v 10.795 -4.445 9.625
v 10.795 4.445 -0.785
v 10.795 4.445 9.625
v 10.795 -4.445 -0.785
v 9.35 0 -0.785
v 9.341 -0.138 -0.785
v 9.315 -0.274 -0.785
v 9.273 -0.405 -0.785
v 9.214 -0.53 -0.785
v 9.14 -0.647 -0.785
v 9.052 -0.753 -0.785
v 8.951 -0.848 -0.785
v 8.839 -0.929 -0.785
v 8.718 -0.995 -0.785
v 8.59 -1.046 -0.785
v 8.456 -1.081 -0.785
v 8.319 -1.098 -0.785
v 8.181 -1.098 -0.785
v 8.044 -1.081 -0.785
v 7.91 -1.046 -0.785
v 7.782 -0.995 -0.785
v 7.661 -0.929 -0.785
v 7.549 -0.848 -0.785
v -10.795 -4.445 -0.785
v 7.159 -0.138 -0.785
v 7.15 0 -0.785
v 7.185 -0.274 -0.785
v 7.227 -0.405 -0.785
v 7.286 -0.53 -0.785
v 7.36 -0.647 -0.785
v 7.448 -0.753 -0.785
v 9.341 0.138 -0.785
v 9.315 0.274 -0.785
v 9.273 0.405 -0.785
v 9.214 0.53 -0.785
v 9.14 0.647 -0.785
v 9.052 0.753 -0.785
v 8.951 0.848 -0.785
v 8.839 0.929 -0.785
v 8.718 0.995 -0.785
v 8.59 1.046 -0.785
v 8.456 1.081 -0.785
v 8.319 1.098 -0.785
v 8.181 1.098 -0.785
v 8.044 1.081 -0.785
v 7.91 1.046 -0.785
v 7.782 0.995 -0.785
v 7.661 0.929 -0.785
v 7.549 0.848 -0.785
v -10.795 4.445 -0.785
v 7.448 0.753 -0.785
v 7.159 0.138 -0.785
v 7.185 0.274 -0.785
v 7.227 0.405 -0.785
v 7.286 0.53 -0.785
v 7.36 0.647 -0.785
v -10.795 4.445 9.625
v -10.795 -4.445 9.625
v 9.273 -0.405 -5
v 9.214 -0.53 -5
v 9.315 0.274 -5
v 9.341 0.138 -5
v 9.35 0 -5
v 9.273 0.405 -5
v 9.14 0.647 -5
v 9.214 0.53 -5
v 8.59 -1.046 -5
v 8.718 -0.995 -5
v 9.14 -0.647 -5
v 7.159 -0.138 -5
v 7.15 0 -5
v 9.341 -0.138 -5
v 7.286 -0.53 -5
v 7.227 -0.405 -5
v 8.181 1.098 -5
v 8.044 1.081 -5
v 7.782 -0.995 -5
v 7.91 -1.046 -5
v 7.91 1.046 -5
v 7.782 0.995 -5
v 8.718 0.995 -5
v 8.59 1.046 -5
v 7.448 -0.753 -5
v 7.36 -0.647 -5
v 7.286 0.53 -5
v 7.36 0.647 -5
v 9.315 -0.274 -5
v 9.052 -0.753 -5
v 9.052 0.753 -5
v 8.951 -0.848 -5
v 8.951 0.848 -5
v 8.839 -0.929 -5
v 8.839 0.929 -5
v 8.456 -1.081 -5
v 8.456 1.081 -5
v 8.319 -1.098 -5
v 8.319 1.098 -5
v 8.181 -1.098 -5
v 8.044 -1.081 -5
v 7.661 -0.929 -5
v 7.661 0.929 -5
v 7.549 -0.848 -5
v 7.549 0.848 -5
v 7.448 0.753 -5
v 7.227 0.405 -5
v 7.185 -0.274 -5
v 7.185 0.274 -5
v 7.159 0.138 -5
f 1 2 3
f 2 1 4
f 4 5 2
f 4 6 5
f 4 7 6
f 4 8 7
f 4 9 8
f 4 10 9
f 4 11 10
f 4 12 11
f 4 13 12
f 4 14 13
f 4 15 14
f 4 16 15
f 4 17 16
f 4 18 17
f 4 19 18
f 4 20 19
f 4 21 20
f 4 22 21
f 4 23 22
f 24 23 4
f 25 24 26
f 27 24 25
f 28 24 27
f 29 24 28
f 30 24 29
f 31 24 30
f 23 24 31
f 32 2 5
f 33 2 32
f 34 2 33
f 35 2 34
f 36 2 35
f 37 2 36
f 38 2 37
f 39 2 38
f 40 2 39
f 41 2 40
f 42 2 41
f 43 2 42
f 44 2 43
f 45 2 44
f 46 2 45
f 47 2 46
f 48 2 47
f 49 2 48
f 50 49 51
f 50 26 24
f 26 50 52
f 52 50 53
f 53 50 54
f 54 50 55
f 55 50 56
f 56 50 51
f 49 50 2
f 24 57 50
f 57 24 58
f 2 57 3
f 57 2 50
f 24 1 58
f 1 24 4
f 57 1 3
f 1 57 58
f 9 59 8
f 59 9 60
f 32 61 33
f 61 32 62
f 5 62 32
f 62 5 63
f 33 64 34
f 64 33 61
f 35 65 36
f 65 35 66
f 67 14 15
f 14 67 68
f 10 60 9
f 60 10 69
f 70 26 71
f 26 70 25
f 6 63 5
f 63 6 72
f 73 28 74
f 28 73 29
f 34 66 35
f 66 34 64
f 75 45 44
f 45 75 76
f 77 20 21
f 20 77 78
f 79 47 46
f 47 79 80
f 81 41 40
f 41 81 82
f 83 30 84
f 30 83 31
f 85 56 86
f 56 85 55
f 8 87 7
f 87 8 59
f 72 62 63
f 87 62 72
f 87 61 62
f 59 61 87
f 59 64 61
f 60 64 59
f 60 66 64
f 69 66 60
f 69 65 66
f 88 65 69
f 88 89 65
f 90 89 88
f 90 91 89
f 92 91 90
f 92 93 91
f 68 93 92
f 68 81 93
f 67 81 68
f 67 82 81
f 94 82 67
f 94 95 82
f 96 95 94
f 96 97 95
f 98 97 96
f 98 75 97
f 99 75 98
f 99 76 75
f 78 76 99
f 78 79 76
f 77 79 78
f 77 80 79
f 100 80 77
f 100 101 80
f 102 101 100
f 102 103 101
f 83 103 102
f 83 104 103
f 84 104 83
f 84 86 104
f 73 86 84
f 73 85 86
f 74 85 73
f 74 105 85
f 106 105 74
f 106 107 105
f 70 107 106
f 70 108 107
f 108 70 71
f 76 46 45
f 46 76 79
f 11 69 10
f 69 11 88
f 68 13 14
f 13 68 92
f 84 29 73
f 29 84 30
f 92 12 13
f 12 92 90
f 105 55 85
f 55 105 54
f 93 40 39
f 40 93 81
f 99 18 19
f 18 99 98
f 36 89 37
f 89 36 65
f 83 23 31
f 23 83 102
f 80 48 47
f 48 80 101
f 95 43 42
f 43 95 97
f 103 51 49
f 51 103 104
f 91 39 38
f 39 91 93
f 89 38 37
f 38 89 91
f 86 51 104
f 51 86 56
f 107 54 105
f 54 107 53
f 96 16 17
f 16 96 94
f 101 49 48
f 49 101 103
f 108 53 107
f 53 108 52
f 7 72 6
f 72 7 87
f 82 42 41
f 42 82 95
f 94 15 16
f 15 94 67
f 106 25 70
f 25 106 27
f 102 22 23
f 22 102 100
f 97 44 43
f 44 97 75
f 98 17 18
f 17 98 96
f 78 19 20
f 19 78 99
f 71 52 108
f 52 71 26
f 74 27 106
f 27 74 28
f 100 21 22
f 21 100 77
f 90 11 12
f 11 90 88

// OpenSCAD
$fn = 50;

module shortestir(){

        union(){
            cube([21.59, 8.89, 1.57], center = true);
            translate([0,0,5.205]){
            cube([21.59, 8.89, 8.84], center = true);
            }
        }
        translate([8.25,0,0]){
            cylinder(10,d=2.2,center = true);    
        }
        
    
}
shortestir();
